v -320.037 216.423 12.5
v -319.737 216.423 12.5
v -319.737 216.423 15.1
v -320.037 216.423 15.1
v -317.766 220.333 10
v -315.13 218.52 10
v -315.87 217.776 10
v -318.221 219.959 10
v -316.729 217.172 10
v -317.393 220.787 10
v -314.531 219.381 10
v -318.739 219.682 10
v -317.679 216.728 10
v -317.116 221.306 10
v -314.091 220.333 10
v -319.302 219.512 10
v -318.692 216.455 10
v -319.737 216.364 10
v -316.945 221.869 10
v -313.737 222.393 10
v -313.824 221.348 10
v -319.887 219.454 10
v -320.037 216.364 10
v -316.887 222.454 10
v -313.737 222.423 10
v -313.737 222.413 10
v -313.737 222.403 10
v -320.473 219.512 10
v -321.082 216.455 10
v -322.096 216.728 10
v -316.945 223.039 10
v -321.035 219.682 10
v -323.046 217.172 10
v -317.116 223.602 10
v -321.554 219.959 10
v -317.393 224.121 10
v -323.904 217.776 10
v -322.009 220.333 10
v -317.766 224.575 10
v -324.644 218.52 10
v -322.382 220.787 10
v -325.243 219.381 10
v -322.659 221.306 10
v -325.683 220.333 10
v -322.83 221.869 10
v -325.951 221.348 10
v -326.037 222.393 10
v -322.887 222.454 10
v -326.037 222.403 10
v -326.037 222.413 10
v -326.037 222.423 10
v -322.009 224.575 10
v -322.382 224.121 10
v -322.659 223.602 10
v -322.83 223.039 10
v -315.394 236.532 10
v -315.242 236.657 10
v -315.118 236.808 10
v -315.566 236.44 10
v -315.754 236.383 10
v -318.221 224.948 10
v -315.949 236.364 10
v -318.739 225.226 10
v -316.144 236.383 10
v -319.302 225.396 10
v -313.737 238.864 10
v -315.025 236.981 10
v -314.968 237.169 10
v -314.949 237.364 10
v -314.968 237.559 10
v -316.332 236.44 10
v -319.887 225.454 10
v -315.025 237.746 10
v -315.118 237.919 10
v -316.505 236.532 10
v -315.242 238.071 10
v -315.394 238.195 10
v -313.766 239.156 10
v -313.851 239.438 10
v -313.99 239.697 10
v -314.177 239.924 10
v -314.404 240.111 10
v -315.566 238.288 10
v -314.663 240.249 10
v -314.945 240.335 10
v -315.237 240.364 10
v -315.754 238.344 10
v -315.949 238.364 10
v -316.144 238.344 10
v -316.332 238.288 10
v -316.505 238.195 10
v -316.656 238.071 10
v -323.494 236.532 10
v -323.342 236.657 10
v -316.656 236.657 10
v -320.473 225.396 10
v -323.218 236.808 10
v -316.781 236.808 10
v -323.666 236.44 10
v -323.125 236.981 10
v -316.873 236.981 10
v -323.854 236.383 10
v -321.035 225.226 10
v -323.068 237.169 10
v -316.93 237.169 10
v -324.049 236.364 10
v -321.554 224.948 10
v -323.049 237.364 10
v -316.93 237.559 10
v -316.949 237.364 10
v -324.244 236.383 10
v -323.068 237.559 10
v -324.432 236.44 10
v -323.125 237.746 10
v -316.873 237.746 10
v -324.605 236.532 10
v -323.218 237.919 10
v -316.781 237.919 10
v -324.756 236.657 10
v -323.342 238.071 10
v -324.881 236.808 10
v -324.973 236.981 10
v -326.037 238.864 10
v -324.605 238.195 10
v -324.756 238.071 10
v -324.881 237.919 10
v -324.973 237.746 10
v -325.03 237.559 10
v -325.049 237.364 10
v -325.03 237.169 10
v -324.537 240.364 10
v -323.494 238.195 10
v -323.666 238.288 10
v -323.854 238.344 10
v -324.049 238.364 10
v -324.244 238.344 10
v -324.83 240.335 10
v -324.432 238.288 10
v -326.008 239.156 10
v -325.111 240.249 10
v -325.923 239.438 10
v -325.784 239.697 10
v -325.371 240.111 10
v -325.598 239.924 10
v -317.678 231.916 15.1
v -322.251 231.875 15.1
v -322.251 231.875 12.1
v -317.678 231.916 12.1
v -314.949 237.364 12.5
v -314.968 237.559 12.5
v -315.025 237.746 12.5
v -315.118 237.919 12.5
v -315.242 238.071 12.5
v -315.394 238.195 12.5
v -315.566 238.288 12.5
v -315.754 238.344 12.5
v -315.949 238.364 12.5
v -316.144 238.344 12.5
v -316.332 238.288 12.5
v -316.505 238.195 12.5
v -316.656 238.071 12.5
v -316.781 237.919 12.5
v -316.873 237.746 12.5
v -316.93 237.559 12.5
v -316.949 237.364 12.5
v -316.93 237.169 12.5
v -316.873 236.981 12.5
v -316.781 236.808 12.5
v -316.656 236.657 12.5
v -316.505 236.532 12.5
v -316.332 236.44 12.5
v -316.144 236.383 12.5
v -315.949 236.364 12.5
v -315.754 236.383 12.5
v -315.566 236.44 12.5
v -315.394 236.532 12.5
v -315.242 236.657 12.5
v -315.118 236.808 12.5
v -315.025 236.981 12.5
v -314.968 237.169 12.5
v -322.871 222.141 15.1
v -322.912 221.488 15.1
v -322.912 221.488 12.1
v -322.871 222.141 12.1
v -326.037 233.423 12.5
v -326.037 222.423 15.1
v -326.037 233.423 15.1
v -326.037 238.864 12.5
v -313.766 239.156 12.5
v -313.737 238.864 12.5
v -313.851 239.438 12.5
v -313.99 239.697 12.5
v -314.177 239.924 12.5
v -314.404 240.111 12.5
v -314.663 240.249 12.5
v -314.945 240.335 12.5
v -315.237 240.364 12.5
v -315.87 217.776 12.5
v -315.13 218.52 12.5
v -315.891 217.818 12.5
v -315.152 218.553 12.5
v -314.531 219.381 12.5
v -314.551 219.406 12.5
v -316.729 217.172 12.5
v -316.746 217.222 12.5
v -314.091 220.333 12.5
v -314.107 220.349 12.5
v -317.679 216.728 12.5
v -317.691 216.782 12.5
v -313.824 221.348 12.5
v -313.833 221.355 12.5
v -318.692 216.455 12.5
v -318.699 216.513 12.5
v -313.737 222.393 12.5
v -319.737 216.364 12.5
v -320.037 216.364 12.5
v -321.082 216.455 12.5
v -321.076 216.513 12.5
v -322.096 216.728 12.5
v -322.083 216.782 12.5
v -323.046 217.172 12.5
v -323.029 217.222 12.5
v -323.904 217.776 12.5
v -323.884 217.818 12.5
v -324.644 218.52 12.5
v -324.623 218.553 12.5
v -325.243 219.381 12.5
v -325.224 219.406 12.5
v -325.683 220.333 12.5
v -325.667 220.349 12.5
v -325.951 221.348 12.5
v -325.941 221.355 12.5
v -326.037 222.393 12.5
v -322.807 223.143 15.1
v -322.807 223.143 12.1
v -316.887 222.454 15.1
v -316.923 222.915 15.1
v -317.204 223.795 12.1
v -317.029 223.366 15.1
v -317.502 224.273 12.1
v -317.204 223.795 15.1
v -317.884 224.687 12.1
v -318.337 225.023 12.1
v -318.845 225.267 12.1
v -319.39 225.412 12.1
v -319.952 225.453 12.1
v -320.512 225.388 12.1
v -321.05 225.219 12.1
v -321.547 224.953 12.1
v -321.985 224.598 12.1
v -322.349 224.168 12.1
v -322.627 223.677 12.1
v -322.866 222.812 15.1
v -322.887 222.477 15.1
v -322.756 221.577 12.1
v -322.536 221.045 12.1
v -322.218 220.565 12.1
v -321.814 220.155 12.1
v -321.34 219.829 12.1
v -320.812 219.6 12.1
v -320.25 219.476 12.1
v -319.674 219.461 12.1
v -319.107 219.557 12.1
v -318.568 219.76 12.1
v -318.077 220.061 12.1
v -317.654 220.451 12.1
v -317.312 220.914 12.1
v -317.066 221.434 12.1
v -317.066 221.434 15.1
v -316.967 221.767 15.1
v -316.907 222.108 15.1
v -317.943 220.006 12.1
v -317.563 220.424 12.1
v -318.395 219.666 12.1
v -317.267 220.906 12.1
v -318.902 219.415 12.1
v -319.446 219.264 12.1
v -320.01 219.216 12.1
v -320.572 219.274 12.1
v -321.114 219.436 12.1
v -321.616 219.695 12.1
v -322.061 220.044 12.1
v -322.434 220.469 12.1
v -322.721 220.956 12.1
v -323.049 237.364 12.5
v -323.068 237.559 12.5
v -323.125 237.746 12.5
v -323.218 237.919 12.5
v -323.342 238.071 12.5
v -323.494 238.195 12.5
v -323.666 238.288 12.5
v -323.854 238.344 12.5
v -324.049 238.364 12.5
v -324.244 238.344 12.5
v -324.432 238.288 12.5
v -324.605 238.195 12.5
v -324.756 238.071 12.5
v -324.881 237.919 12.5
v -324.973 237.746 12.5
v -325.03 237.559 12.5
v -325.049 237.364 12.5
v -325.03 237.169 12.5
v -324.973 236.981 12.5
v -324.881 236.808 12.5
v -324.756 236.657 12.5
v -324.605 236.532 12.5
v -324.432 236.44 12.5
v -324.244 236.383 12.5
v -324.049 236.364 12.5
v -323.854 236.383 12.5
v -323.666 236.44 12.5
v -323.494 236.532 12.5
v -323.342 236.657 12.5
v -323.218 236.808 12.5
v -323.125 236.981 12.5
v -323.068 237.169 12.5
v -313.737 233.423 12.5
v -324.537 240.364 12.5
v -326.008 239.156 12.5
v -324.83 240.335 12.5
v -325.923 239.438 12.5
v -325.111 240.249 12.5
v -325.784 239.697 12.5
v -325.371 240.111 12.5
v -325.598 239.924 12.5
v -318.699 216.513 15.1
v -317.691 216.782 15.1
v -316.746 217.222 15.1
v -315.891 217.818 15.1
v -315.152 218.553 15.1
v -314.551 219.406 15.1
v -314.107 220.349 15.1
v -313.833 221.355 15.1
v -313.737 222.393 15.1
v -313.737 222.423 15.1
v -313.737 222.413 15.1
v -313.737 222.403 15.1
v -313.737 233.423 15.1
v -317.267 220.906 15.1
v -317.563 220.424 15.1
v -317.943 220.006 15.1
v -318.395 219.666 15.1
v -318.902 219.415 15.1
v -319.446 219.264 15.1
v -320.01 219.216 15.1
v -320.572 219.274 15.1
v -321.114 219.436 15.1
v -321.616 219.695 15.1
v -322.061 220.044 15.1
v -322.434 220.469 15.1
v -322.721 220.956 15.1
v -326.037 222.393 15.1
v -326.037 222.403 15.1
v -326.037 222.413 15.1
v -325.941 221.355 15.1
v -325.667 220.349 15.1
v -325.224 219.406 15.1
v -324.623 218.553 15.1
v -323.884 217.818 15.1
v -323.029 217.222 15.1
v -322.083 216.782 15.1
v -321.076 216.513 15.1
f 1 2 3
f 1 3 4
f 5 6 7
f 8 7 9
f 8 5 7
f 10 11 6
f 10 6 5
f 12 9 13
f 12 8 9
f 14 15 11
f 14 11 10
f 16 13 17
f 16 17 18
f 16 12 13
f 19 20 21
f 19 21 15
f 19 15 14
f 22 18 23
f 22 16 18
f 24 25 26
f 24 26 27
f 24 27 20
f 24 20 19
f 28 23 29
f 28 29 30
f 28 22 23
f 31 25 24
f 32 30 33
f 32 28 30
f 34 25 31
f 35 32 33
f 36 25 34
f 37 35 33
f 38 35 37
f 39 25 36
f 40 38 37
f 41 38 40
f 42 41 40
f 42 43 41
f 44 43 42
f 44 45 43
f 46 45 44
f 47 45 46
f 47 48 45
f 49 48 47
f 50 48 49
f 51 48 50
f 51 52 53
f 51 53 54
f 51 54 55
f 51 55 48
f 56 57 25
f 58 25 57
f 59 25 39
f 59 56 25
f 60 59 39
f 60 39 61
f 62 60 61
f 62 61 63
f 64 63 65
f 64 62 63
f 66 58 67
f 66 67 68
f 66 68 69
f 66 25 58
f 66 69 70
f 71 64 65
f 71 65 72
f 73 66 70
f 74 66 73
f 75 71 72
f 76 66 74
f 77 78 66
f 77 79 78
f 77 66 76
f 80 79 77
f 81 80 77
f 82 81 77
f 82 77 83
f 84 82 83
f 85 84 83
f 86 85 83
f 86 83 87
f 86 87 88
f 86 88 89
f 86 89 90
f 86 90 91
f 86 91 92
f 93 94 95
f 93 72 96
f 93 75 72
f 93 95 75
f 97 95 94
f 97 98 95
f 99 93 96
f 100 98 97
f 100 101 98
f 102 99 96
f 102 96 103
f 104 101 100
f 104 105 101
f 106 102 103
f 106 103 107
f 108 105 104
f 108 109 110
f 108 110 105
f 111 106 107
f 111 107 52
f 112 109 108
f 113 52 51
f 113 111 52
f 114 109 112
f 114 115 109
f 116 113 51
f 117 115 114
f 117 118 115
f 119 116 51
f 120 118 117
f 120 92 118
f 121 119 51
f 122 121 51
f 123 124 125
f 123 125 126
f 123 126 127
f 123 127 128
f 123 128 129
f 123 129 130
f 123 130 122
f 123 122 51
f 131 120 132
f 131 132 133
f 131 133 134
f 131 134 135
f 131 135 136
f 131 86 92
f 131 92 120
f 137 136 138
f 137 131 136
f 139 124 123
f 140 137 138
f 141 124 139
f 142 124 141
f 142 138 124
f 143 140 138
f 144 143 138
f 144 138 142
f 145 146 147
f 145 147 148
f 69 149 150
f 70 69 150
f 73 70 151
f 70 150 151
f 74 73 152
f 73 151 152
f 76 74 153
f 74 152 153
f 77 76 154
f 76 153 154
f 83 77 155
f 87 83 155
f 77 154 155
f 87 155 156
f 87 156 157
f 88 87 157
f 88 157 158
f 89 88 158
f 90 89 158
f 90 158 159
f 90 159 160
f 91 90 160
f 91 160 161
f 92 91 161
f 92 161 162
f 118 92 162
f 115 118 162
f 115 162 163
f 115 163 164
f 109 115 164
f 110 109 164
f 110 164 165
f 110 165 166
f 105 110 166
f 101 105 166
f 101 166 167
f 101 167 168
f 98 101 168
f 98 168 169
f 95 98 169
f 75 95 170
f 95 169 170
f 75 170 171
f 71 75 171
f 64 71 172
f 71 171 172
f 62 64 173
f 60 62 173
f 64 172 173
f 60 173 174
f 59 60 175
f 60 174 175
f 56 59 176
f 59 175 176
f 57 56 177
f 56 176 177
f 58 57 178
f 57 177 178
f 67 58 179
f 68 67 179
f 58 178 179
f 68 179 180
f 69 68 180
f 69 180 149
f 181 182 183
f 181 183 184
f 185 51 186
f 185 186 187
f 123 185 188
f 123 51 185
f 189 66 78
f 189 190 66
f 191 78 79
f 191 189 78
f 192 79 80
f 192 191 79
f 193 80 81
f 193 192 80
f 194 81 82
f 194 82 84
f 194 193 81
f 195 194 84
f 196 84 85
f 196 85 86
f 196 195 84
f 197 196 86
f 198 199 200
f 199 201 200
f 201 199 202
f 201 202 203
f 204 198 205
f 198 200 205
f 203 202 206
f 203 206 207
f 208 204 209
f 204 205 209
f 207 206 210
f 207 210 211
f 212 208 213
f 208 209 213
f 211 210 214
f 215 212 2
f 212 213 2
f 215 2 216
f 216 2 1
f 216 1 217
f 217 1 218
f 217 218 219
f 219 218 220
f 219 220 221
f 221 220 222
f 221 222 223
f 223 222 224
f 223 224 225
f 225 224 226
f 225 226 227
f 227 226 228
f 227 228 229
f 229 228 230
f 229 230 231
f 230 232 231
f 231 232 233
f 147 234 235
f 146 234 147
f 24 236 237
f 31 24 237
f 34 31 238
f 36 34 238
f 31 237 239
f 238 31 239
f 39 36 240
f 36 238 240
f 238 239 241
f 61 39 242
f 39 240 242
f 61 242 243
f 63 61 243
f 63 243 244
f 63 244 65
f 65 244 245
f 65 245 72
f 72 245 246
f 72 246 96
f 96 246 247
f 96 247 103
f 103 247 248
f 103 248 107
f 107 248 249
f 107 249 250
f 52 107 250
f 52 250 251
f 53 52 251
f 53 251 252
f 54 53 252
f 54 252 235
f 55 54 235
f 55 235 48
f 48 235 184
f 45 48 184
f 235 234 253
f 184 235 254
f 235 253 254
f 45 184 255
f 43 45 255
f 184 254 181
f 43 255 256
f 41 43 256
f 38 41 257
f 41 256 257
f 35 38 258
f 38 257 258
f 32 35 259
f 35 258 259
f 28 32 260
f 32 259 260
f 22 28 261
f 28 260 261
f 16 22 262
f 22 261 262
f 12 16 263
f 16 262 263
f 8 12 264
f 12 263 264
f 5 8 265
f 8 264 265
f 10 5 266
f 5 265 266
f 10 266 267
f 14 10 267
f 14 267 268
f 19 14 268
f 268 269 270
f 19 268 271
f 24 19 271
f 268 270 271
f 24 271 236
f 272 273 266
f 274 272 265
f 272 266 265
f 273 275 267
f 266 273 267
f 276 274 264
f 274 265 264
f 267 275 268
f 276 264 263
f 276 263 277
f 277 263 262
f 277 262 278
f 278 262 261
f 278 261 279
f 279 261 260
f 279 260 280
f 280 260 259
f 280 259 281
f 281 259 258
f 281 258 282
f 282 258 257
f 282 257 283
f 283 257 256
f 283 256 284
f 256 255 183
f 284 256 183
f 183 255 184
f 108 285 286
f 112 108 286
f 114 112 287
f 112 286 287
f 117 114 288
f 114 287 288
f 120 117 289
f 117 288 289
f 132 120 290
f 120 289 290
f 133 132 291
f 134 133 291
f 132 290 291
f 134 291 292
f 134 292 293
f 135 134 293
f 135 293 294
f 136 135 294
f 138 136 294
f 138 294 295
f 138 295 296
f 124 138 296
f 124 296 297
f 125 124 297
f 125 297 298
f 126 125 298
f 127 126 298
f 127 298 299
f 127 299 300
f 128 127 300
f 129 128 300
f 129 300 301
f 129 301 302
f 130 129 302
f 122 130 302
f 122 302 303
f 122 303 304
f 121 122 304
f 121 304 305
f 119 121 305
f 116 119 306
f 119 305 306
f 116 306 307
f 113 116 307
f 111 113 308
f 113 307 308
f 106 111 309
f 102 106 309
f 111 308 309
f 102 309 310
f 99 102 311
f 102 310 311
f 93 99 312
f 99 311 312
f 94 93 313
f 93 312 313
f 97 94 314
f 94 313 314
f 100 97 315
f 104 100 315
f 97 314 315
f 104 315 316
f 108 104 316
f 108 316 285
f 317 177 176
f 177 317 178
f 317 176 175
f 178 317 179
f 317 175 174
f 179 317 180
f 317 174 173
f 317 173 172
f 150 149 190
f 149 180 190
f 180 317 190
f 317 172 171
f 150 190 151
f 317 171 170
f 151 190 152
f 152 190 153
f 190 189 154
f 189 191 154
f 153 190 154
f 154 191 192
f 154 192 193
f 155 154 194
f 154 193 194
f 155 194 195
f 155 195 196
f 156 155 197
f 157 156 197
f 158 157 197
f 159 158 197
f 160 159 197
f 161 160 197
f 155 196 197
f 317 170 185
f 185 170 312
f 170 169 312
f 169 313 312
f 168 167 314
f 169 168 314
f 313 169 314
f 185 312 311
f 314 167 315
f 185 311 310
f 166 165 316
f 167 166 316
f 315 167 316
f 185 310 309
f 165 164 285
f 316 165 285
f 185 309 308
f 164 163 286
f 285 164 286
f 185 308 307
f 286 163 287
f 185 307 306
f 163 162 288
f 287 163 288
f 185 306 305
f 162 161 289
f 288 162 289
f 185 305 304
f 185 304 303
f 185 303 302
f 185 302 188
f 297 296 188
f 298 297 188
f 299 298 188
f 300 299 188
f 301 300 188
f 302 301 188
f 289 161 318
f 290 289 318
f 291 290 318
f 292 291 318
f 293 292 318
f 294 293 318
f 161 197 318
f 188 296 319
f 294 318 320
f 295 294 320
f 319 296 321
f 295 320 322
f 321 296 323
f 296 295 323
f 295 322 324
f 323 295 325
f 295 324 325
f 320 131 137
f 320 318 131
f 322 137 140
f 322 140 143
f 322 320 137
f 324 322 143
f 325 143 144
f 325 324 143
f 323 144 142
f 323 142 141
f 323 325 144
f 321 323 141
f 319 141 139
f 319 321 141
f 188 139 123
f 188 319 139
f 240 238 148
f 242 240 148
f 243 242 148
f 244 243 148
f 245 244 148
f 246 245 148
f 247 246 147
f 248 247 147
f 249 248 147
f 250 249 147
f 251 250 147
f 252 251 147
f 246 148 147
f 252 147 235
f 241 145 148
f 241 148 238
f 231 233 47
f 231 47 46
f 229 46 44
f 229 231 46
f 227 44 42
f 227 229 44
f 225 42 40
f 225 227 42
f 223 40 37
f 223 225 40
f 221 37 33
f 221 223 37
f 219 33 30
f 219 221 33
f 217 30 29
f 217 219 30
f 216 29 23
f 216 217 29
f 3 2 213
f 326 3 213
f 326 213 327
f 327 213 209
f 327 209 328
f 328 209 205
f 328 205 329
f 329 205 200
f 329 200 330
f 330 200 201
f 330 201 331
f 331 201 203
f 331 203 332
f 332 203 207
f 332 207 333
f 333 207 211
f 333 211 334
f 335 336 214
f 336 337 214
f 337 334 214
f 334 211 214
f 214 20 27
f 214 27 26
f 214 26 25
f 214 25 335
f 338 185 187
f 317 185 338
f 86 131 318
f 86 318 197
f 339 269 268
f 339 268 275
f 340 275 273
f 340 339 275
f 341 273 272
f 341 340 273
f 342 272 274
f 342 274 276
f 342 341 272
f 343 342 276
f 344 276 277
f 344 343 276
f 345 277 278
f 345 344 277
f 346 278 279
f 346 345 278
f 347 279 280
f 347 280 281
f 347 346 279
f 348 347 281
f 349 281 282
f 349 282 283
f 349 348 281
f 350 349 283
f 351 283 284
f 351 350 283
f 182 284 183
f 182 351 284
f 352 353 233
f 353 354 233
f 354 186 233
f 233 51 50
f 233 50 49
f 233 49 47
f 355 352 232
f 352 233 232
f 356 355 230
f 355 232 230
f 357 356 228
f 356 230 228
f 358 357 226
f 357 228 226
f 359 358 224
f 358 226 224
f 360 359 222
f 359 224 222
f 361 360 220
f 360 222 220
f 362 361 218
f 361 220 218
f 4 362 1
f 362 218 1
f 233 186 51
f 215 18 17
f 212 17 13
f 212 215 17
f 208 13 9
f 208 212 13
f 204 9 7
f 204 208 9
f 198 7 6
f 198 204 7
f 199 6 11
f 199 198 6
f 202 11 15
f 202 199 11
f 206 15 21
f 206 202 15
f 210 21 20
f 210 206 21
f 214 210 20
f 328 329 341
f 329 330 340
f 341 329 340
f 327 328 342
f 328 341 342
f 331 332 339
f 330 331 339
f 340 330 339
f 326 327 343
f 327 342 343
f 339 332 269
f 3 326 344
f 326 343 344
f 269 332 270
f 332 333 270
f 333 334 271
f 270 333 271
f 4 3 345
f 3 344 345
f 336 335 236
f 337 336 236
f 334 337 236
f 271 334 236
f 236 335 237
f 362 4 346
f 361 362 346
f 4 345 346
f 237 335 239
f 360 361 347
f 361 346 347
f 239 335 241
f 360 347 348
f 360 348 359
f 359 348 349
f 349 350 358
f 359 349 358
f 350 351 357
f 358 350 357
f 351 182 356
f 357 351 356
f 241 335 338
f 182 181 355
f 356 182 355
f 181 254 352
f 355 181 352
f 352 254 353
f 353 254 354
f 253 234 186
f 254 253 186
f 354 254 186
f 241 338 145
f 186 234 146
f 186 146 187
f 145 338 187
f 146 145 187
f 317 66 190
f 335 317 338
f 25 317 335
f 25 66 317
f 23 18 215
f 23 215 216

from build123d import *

# Parameters (mm, degrees)
BOSS_EXTRUDE1_DEPTH = 2.5
FILLET1_R           = 6
FILLET2_R           = 1.5
SKETCH3_R           = 0.9999999999999983
CUT_EXTRUDE1_DEPTH  = 3.5
BOSS_EXTRUDE2_DEPTH = 2.6
SKETCH5_R           = 2.9999999999999947
CUT_EXTRUDE2_DEPTH  = 406.0937861882827
CUT_EXTRUDE3_DEPTH  = 3
FILLET3_R           = 6


with BuildPart() as part:
    # Sketch2 → Boss-Extrude1 (new body)
    with BuildSketch(Plane.XY.offset(10)):
        Polygon((-326.0372348081085, 240.3636560028167), (-313.73723480810855, 240.3636560028167), (-313.7372348081085, 216.3636560028167), (-326.0372348081085, 216.3636560028167), align=None)
    extrude(amount=BOSS_EXTRUDE1_DEPTH)

    # Fillet1
    fillet1_edges = [part.edges().sort_by_distance(p)[0] for p in [
        (-313.7372348081085, 216.3636560028167, 11.25),
        (-326.0372348081085, 216.3636560028167, 11.25),
    ]]
    fillet(fillet1_edges, radius=FILLET1_R)

    # Fillet2
    fillet2_edges = [part.edges().sort_by_distance(p)[0] for p in [
        (-326.0372348081085, 240.3636560028167, 11.25),
        (-313.73723480810855, 240.3636560028167, 11.25),
    ]]
    fillet(fillet2_edges, radius=FILLET2_R)

    # Sketch3 → Cut-Extrude1 (cut)
    with BuildSketch(Plane.XY.offset(12.5)):
        with Locations((-324.0490905957561, 237.3636560028167)):
            Circle(SKETCH3_R)
        with Locations((-315.94909059575616, 237.3636560028167)):
            Circle(SKETCH3_R)
    extrude(amount=-CUT_EXTRUDE1_DEPTH, mode=Mode.SUBTRACT)

    # Sketch4 → Boss-Extrude2 (add)
    with BuildSketch(Plane.XY.offset(12.5)):
        Polygon((-326.0372348081085, 233.42269782366114), (-313.7372348081087, 233.42269782366114), (-313.7372348081086, 216.42269782366117), (-326.0372348081085, 216.42269782366117), align=None)
    extrude(amount=BOSS_EXTRUDE2_DEPTH)

    # Sketch5 → Cut-Extrude2 (cut, through all)
    with BuildSketch(Plane.XY.offset(15.100000000000001)):
        with Locations((-319.88723480810853, 222.45389289856294)):
            Circle(SKETCH5_R)
    extrude(amount=-CUT_EXTRUDE2_DEPTH, mode=Mode.SUBTRACT)

    # Sketch6 → Cut-Extrude3 (cut)
    with BuildSketch(Plane.XY.offset(15.100000000000001)):
        with BuildLine():
            Line((-322.2509023799276, 231.87527778635172), (-317.6775841933858, 231.916179418332))
            Line((-317.6775841933858, 231.916179418332), (-317.06574253676285, 221.43449044480062))
            ThreePointArc((-317.06574253676285, 221.43449044480062), (-320.0096946123076, 219.21611603523496), (-322.9124096628873, 221.4881820948509))
            Line((-322.9124096628873, 221.4881820948509), (-322.2509023799276, 231.87527778635172))
        make_face()
    extrude(amount=-CUT_EXTRUDE3_DEPTH, mode=Mode.SUBTRACT)

    # Fillet3
    # the kernel refuses this fillet: 6 mm, written as the material it takes off along each edge
    with BuildSketch(Plane(origin=(-326.0372348081085, 216.42269782366117, -2.5000000000000018), x_dir=(1, 0, 0), z_dir=(0, 0, 1))) as fillet3_piece_1_section:
        with BuildLine():
            CenterArc((FILLET3_R, FILLET3_R), FILLET3_R, 180, 90)
            Line((0, FILLET3_R), (0, 0))
            Line((0, 0), (FILLET3_R, 0))
        make_face()
    fillet3_piece_1 = extrude(amount=32.6, mode=Mode.PRIVATE)
    fillet3_piece_1 = fillet3_piece_1 - Plane(origin=(-320.0372348081085, 222.3636560028167, 11.24999999999967), x_dir=(0, -1, 0), z_dir=(0, 0, 1)) * Cylinder(6, 90, mode=Mode.PRIVATE)
    add(fillet3_piece_1, mode=Mode.SUBTRACT)
    with BuildSketch(Plane(origin=(-326.0372348081085, 216.42269782366117, 12.5), x_dir=(1, 0, 0), z_dir=(0, 0, 1))) as fillet3_piece_2:
        with BuildLine():
            CenterArc((FILLET3_R, FILLET3_R), FILLET3_R, 180, 90)
            Line((0, FILLET3_R), (0, 0))
            Line((0, 0), (FILLET3_R, 0))
        make_face()
    extrude(amount=17.6, mode=Mode.SUBTRACT)
    with BuildSketch(Plane(origin=(-313.7372348081085, 216.42269782366117, -2.5000000000000018), x_dir=(0, 1, 0), z_dir=(0, 0, 1))) as fillet3_piece_3_section:
        with BuildLine():
            CenterArc((FILLET3_R, FILLET3_R), FILLET3_R, 180, 90)
            Line((0, FILLET3_R), (0, 0))
            Line((0, 0), (FILLET3_R, 0))
        make_face()
    fillet3_piece_3 = extrude(amount=32.6, mode=Mode.PRIVATE)
    fillet3_piece_3 = fillet3_piece_3 - Plane(origin=(-319.7372348081085, 222.3636560028167, 11.250000000000943), x_dir=(1, 2.37e-15, 0), z_dir=(0, 0, 1)) * Cylinder(6, 90, mode=Mode.PRIVATE)
    add(fillet3_piece_3, mode=Mode.SUBTRACT)
    with BuildSketch(Plane(origin=(-313.7372348081086, 216.42269782366117, 12.5), x_dir=(1.895e-14, 1, 0), z_dir=(0, 0, 1))) as fillet3_piece_4:
        with BuildLine():
            CenterArc((FILLET3_R, FILLET3_R), FILLET3_R, 180, 90.00000000000108)
            Line((-1.1369e-13, FILLET3_R), (0, 0))
            Line((0, 0), (FILLET3_R, 0))
        make_face()
    extrude(amount=17.6, mode=Mode.SUBTRACT)


solid = part.part
